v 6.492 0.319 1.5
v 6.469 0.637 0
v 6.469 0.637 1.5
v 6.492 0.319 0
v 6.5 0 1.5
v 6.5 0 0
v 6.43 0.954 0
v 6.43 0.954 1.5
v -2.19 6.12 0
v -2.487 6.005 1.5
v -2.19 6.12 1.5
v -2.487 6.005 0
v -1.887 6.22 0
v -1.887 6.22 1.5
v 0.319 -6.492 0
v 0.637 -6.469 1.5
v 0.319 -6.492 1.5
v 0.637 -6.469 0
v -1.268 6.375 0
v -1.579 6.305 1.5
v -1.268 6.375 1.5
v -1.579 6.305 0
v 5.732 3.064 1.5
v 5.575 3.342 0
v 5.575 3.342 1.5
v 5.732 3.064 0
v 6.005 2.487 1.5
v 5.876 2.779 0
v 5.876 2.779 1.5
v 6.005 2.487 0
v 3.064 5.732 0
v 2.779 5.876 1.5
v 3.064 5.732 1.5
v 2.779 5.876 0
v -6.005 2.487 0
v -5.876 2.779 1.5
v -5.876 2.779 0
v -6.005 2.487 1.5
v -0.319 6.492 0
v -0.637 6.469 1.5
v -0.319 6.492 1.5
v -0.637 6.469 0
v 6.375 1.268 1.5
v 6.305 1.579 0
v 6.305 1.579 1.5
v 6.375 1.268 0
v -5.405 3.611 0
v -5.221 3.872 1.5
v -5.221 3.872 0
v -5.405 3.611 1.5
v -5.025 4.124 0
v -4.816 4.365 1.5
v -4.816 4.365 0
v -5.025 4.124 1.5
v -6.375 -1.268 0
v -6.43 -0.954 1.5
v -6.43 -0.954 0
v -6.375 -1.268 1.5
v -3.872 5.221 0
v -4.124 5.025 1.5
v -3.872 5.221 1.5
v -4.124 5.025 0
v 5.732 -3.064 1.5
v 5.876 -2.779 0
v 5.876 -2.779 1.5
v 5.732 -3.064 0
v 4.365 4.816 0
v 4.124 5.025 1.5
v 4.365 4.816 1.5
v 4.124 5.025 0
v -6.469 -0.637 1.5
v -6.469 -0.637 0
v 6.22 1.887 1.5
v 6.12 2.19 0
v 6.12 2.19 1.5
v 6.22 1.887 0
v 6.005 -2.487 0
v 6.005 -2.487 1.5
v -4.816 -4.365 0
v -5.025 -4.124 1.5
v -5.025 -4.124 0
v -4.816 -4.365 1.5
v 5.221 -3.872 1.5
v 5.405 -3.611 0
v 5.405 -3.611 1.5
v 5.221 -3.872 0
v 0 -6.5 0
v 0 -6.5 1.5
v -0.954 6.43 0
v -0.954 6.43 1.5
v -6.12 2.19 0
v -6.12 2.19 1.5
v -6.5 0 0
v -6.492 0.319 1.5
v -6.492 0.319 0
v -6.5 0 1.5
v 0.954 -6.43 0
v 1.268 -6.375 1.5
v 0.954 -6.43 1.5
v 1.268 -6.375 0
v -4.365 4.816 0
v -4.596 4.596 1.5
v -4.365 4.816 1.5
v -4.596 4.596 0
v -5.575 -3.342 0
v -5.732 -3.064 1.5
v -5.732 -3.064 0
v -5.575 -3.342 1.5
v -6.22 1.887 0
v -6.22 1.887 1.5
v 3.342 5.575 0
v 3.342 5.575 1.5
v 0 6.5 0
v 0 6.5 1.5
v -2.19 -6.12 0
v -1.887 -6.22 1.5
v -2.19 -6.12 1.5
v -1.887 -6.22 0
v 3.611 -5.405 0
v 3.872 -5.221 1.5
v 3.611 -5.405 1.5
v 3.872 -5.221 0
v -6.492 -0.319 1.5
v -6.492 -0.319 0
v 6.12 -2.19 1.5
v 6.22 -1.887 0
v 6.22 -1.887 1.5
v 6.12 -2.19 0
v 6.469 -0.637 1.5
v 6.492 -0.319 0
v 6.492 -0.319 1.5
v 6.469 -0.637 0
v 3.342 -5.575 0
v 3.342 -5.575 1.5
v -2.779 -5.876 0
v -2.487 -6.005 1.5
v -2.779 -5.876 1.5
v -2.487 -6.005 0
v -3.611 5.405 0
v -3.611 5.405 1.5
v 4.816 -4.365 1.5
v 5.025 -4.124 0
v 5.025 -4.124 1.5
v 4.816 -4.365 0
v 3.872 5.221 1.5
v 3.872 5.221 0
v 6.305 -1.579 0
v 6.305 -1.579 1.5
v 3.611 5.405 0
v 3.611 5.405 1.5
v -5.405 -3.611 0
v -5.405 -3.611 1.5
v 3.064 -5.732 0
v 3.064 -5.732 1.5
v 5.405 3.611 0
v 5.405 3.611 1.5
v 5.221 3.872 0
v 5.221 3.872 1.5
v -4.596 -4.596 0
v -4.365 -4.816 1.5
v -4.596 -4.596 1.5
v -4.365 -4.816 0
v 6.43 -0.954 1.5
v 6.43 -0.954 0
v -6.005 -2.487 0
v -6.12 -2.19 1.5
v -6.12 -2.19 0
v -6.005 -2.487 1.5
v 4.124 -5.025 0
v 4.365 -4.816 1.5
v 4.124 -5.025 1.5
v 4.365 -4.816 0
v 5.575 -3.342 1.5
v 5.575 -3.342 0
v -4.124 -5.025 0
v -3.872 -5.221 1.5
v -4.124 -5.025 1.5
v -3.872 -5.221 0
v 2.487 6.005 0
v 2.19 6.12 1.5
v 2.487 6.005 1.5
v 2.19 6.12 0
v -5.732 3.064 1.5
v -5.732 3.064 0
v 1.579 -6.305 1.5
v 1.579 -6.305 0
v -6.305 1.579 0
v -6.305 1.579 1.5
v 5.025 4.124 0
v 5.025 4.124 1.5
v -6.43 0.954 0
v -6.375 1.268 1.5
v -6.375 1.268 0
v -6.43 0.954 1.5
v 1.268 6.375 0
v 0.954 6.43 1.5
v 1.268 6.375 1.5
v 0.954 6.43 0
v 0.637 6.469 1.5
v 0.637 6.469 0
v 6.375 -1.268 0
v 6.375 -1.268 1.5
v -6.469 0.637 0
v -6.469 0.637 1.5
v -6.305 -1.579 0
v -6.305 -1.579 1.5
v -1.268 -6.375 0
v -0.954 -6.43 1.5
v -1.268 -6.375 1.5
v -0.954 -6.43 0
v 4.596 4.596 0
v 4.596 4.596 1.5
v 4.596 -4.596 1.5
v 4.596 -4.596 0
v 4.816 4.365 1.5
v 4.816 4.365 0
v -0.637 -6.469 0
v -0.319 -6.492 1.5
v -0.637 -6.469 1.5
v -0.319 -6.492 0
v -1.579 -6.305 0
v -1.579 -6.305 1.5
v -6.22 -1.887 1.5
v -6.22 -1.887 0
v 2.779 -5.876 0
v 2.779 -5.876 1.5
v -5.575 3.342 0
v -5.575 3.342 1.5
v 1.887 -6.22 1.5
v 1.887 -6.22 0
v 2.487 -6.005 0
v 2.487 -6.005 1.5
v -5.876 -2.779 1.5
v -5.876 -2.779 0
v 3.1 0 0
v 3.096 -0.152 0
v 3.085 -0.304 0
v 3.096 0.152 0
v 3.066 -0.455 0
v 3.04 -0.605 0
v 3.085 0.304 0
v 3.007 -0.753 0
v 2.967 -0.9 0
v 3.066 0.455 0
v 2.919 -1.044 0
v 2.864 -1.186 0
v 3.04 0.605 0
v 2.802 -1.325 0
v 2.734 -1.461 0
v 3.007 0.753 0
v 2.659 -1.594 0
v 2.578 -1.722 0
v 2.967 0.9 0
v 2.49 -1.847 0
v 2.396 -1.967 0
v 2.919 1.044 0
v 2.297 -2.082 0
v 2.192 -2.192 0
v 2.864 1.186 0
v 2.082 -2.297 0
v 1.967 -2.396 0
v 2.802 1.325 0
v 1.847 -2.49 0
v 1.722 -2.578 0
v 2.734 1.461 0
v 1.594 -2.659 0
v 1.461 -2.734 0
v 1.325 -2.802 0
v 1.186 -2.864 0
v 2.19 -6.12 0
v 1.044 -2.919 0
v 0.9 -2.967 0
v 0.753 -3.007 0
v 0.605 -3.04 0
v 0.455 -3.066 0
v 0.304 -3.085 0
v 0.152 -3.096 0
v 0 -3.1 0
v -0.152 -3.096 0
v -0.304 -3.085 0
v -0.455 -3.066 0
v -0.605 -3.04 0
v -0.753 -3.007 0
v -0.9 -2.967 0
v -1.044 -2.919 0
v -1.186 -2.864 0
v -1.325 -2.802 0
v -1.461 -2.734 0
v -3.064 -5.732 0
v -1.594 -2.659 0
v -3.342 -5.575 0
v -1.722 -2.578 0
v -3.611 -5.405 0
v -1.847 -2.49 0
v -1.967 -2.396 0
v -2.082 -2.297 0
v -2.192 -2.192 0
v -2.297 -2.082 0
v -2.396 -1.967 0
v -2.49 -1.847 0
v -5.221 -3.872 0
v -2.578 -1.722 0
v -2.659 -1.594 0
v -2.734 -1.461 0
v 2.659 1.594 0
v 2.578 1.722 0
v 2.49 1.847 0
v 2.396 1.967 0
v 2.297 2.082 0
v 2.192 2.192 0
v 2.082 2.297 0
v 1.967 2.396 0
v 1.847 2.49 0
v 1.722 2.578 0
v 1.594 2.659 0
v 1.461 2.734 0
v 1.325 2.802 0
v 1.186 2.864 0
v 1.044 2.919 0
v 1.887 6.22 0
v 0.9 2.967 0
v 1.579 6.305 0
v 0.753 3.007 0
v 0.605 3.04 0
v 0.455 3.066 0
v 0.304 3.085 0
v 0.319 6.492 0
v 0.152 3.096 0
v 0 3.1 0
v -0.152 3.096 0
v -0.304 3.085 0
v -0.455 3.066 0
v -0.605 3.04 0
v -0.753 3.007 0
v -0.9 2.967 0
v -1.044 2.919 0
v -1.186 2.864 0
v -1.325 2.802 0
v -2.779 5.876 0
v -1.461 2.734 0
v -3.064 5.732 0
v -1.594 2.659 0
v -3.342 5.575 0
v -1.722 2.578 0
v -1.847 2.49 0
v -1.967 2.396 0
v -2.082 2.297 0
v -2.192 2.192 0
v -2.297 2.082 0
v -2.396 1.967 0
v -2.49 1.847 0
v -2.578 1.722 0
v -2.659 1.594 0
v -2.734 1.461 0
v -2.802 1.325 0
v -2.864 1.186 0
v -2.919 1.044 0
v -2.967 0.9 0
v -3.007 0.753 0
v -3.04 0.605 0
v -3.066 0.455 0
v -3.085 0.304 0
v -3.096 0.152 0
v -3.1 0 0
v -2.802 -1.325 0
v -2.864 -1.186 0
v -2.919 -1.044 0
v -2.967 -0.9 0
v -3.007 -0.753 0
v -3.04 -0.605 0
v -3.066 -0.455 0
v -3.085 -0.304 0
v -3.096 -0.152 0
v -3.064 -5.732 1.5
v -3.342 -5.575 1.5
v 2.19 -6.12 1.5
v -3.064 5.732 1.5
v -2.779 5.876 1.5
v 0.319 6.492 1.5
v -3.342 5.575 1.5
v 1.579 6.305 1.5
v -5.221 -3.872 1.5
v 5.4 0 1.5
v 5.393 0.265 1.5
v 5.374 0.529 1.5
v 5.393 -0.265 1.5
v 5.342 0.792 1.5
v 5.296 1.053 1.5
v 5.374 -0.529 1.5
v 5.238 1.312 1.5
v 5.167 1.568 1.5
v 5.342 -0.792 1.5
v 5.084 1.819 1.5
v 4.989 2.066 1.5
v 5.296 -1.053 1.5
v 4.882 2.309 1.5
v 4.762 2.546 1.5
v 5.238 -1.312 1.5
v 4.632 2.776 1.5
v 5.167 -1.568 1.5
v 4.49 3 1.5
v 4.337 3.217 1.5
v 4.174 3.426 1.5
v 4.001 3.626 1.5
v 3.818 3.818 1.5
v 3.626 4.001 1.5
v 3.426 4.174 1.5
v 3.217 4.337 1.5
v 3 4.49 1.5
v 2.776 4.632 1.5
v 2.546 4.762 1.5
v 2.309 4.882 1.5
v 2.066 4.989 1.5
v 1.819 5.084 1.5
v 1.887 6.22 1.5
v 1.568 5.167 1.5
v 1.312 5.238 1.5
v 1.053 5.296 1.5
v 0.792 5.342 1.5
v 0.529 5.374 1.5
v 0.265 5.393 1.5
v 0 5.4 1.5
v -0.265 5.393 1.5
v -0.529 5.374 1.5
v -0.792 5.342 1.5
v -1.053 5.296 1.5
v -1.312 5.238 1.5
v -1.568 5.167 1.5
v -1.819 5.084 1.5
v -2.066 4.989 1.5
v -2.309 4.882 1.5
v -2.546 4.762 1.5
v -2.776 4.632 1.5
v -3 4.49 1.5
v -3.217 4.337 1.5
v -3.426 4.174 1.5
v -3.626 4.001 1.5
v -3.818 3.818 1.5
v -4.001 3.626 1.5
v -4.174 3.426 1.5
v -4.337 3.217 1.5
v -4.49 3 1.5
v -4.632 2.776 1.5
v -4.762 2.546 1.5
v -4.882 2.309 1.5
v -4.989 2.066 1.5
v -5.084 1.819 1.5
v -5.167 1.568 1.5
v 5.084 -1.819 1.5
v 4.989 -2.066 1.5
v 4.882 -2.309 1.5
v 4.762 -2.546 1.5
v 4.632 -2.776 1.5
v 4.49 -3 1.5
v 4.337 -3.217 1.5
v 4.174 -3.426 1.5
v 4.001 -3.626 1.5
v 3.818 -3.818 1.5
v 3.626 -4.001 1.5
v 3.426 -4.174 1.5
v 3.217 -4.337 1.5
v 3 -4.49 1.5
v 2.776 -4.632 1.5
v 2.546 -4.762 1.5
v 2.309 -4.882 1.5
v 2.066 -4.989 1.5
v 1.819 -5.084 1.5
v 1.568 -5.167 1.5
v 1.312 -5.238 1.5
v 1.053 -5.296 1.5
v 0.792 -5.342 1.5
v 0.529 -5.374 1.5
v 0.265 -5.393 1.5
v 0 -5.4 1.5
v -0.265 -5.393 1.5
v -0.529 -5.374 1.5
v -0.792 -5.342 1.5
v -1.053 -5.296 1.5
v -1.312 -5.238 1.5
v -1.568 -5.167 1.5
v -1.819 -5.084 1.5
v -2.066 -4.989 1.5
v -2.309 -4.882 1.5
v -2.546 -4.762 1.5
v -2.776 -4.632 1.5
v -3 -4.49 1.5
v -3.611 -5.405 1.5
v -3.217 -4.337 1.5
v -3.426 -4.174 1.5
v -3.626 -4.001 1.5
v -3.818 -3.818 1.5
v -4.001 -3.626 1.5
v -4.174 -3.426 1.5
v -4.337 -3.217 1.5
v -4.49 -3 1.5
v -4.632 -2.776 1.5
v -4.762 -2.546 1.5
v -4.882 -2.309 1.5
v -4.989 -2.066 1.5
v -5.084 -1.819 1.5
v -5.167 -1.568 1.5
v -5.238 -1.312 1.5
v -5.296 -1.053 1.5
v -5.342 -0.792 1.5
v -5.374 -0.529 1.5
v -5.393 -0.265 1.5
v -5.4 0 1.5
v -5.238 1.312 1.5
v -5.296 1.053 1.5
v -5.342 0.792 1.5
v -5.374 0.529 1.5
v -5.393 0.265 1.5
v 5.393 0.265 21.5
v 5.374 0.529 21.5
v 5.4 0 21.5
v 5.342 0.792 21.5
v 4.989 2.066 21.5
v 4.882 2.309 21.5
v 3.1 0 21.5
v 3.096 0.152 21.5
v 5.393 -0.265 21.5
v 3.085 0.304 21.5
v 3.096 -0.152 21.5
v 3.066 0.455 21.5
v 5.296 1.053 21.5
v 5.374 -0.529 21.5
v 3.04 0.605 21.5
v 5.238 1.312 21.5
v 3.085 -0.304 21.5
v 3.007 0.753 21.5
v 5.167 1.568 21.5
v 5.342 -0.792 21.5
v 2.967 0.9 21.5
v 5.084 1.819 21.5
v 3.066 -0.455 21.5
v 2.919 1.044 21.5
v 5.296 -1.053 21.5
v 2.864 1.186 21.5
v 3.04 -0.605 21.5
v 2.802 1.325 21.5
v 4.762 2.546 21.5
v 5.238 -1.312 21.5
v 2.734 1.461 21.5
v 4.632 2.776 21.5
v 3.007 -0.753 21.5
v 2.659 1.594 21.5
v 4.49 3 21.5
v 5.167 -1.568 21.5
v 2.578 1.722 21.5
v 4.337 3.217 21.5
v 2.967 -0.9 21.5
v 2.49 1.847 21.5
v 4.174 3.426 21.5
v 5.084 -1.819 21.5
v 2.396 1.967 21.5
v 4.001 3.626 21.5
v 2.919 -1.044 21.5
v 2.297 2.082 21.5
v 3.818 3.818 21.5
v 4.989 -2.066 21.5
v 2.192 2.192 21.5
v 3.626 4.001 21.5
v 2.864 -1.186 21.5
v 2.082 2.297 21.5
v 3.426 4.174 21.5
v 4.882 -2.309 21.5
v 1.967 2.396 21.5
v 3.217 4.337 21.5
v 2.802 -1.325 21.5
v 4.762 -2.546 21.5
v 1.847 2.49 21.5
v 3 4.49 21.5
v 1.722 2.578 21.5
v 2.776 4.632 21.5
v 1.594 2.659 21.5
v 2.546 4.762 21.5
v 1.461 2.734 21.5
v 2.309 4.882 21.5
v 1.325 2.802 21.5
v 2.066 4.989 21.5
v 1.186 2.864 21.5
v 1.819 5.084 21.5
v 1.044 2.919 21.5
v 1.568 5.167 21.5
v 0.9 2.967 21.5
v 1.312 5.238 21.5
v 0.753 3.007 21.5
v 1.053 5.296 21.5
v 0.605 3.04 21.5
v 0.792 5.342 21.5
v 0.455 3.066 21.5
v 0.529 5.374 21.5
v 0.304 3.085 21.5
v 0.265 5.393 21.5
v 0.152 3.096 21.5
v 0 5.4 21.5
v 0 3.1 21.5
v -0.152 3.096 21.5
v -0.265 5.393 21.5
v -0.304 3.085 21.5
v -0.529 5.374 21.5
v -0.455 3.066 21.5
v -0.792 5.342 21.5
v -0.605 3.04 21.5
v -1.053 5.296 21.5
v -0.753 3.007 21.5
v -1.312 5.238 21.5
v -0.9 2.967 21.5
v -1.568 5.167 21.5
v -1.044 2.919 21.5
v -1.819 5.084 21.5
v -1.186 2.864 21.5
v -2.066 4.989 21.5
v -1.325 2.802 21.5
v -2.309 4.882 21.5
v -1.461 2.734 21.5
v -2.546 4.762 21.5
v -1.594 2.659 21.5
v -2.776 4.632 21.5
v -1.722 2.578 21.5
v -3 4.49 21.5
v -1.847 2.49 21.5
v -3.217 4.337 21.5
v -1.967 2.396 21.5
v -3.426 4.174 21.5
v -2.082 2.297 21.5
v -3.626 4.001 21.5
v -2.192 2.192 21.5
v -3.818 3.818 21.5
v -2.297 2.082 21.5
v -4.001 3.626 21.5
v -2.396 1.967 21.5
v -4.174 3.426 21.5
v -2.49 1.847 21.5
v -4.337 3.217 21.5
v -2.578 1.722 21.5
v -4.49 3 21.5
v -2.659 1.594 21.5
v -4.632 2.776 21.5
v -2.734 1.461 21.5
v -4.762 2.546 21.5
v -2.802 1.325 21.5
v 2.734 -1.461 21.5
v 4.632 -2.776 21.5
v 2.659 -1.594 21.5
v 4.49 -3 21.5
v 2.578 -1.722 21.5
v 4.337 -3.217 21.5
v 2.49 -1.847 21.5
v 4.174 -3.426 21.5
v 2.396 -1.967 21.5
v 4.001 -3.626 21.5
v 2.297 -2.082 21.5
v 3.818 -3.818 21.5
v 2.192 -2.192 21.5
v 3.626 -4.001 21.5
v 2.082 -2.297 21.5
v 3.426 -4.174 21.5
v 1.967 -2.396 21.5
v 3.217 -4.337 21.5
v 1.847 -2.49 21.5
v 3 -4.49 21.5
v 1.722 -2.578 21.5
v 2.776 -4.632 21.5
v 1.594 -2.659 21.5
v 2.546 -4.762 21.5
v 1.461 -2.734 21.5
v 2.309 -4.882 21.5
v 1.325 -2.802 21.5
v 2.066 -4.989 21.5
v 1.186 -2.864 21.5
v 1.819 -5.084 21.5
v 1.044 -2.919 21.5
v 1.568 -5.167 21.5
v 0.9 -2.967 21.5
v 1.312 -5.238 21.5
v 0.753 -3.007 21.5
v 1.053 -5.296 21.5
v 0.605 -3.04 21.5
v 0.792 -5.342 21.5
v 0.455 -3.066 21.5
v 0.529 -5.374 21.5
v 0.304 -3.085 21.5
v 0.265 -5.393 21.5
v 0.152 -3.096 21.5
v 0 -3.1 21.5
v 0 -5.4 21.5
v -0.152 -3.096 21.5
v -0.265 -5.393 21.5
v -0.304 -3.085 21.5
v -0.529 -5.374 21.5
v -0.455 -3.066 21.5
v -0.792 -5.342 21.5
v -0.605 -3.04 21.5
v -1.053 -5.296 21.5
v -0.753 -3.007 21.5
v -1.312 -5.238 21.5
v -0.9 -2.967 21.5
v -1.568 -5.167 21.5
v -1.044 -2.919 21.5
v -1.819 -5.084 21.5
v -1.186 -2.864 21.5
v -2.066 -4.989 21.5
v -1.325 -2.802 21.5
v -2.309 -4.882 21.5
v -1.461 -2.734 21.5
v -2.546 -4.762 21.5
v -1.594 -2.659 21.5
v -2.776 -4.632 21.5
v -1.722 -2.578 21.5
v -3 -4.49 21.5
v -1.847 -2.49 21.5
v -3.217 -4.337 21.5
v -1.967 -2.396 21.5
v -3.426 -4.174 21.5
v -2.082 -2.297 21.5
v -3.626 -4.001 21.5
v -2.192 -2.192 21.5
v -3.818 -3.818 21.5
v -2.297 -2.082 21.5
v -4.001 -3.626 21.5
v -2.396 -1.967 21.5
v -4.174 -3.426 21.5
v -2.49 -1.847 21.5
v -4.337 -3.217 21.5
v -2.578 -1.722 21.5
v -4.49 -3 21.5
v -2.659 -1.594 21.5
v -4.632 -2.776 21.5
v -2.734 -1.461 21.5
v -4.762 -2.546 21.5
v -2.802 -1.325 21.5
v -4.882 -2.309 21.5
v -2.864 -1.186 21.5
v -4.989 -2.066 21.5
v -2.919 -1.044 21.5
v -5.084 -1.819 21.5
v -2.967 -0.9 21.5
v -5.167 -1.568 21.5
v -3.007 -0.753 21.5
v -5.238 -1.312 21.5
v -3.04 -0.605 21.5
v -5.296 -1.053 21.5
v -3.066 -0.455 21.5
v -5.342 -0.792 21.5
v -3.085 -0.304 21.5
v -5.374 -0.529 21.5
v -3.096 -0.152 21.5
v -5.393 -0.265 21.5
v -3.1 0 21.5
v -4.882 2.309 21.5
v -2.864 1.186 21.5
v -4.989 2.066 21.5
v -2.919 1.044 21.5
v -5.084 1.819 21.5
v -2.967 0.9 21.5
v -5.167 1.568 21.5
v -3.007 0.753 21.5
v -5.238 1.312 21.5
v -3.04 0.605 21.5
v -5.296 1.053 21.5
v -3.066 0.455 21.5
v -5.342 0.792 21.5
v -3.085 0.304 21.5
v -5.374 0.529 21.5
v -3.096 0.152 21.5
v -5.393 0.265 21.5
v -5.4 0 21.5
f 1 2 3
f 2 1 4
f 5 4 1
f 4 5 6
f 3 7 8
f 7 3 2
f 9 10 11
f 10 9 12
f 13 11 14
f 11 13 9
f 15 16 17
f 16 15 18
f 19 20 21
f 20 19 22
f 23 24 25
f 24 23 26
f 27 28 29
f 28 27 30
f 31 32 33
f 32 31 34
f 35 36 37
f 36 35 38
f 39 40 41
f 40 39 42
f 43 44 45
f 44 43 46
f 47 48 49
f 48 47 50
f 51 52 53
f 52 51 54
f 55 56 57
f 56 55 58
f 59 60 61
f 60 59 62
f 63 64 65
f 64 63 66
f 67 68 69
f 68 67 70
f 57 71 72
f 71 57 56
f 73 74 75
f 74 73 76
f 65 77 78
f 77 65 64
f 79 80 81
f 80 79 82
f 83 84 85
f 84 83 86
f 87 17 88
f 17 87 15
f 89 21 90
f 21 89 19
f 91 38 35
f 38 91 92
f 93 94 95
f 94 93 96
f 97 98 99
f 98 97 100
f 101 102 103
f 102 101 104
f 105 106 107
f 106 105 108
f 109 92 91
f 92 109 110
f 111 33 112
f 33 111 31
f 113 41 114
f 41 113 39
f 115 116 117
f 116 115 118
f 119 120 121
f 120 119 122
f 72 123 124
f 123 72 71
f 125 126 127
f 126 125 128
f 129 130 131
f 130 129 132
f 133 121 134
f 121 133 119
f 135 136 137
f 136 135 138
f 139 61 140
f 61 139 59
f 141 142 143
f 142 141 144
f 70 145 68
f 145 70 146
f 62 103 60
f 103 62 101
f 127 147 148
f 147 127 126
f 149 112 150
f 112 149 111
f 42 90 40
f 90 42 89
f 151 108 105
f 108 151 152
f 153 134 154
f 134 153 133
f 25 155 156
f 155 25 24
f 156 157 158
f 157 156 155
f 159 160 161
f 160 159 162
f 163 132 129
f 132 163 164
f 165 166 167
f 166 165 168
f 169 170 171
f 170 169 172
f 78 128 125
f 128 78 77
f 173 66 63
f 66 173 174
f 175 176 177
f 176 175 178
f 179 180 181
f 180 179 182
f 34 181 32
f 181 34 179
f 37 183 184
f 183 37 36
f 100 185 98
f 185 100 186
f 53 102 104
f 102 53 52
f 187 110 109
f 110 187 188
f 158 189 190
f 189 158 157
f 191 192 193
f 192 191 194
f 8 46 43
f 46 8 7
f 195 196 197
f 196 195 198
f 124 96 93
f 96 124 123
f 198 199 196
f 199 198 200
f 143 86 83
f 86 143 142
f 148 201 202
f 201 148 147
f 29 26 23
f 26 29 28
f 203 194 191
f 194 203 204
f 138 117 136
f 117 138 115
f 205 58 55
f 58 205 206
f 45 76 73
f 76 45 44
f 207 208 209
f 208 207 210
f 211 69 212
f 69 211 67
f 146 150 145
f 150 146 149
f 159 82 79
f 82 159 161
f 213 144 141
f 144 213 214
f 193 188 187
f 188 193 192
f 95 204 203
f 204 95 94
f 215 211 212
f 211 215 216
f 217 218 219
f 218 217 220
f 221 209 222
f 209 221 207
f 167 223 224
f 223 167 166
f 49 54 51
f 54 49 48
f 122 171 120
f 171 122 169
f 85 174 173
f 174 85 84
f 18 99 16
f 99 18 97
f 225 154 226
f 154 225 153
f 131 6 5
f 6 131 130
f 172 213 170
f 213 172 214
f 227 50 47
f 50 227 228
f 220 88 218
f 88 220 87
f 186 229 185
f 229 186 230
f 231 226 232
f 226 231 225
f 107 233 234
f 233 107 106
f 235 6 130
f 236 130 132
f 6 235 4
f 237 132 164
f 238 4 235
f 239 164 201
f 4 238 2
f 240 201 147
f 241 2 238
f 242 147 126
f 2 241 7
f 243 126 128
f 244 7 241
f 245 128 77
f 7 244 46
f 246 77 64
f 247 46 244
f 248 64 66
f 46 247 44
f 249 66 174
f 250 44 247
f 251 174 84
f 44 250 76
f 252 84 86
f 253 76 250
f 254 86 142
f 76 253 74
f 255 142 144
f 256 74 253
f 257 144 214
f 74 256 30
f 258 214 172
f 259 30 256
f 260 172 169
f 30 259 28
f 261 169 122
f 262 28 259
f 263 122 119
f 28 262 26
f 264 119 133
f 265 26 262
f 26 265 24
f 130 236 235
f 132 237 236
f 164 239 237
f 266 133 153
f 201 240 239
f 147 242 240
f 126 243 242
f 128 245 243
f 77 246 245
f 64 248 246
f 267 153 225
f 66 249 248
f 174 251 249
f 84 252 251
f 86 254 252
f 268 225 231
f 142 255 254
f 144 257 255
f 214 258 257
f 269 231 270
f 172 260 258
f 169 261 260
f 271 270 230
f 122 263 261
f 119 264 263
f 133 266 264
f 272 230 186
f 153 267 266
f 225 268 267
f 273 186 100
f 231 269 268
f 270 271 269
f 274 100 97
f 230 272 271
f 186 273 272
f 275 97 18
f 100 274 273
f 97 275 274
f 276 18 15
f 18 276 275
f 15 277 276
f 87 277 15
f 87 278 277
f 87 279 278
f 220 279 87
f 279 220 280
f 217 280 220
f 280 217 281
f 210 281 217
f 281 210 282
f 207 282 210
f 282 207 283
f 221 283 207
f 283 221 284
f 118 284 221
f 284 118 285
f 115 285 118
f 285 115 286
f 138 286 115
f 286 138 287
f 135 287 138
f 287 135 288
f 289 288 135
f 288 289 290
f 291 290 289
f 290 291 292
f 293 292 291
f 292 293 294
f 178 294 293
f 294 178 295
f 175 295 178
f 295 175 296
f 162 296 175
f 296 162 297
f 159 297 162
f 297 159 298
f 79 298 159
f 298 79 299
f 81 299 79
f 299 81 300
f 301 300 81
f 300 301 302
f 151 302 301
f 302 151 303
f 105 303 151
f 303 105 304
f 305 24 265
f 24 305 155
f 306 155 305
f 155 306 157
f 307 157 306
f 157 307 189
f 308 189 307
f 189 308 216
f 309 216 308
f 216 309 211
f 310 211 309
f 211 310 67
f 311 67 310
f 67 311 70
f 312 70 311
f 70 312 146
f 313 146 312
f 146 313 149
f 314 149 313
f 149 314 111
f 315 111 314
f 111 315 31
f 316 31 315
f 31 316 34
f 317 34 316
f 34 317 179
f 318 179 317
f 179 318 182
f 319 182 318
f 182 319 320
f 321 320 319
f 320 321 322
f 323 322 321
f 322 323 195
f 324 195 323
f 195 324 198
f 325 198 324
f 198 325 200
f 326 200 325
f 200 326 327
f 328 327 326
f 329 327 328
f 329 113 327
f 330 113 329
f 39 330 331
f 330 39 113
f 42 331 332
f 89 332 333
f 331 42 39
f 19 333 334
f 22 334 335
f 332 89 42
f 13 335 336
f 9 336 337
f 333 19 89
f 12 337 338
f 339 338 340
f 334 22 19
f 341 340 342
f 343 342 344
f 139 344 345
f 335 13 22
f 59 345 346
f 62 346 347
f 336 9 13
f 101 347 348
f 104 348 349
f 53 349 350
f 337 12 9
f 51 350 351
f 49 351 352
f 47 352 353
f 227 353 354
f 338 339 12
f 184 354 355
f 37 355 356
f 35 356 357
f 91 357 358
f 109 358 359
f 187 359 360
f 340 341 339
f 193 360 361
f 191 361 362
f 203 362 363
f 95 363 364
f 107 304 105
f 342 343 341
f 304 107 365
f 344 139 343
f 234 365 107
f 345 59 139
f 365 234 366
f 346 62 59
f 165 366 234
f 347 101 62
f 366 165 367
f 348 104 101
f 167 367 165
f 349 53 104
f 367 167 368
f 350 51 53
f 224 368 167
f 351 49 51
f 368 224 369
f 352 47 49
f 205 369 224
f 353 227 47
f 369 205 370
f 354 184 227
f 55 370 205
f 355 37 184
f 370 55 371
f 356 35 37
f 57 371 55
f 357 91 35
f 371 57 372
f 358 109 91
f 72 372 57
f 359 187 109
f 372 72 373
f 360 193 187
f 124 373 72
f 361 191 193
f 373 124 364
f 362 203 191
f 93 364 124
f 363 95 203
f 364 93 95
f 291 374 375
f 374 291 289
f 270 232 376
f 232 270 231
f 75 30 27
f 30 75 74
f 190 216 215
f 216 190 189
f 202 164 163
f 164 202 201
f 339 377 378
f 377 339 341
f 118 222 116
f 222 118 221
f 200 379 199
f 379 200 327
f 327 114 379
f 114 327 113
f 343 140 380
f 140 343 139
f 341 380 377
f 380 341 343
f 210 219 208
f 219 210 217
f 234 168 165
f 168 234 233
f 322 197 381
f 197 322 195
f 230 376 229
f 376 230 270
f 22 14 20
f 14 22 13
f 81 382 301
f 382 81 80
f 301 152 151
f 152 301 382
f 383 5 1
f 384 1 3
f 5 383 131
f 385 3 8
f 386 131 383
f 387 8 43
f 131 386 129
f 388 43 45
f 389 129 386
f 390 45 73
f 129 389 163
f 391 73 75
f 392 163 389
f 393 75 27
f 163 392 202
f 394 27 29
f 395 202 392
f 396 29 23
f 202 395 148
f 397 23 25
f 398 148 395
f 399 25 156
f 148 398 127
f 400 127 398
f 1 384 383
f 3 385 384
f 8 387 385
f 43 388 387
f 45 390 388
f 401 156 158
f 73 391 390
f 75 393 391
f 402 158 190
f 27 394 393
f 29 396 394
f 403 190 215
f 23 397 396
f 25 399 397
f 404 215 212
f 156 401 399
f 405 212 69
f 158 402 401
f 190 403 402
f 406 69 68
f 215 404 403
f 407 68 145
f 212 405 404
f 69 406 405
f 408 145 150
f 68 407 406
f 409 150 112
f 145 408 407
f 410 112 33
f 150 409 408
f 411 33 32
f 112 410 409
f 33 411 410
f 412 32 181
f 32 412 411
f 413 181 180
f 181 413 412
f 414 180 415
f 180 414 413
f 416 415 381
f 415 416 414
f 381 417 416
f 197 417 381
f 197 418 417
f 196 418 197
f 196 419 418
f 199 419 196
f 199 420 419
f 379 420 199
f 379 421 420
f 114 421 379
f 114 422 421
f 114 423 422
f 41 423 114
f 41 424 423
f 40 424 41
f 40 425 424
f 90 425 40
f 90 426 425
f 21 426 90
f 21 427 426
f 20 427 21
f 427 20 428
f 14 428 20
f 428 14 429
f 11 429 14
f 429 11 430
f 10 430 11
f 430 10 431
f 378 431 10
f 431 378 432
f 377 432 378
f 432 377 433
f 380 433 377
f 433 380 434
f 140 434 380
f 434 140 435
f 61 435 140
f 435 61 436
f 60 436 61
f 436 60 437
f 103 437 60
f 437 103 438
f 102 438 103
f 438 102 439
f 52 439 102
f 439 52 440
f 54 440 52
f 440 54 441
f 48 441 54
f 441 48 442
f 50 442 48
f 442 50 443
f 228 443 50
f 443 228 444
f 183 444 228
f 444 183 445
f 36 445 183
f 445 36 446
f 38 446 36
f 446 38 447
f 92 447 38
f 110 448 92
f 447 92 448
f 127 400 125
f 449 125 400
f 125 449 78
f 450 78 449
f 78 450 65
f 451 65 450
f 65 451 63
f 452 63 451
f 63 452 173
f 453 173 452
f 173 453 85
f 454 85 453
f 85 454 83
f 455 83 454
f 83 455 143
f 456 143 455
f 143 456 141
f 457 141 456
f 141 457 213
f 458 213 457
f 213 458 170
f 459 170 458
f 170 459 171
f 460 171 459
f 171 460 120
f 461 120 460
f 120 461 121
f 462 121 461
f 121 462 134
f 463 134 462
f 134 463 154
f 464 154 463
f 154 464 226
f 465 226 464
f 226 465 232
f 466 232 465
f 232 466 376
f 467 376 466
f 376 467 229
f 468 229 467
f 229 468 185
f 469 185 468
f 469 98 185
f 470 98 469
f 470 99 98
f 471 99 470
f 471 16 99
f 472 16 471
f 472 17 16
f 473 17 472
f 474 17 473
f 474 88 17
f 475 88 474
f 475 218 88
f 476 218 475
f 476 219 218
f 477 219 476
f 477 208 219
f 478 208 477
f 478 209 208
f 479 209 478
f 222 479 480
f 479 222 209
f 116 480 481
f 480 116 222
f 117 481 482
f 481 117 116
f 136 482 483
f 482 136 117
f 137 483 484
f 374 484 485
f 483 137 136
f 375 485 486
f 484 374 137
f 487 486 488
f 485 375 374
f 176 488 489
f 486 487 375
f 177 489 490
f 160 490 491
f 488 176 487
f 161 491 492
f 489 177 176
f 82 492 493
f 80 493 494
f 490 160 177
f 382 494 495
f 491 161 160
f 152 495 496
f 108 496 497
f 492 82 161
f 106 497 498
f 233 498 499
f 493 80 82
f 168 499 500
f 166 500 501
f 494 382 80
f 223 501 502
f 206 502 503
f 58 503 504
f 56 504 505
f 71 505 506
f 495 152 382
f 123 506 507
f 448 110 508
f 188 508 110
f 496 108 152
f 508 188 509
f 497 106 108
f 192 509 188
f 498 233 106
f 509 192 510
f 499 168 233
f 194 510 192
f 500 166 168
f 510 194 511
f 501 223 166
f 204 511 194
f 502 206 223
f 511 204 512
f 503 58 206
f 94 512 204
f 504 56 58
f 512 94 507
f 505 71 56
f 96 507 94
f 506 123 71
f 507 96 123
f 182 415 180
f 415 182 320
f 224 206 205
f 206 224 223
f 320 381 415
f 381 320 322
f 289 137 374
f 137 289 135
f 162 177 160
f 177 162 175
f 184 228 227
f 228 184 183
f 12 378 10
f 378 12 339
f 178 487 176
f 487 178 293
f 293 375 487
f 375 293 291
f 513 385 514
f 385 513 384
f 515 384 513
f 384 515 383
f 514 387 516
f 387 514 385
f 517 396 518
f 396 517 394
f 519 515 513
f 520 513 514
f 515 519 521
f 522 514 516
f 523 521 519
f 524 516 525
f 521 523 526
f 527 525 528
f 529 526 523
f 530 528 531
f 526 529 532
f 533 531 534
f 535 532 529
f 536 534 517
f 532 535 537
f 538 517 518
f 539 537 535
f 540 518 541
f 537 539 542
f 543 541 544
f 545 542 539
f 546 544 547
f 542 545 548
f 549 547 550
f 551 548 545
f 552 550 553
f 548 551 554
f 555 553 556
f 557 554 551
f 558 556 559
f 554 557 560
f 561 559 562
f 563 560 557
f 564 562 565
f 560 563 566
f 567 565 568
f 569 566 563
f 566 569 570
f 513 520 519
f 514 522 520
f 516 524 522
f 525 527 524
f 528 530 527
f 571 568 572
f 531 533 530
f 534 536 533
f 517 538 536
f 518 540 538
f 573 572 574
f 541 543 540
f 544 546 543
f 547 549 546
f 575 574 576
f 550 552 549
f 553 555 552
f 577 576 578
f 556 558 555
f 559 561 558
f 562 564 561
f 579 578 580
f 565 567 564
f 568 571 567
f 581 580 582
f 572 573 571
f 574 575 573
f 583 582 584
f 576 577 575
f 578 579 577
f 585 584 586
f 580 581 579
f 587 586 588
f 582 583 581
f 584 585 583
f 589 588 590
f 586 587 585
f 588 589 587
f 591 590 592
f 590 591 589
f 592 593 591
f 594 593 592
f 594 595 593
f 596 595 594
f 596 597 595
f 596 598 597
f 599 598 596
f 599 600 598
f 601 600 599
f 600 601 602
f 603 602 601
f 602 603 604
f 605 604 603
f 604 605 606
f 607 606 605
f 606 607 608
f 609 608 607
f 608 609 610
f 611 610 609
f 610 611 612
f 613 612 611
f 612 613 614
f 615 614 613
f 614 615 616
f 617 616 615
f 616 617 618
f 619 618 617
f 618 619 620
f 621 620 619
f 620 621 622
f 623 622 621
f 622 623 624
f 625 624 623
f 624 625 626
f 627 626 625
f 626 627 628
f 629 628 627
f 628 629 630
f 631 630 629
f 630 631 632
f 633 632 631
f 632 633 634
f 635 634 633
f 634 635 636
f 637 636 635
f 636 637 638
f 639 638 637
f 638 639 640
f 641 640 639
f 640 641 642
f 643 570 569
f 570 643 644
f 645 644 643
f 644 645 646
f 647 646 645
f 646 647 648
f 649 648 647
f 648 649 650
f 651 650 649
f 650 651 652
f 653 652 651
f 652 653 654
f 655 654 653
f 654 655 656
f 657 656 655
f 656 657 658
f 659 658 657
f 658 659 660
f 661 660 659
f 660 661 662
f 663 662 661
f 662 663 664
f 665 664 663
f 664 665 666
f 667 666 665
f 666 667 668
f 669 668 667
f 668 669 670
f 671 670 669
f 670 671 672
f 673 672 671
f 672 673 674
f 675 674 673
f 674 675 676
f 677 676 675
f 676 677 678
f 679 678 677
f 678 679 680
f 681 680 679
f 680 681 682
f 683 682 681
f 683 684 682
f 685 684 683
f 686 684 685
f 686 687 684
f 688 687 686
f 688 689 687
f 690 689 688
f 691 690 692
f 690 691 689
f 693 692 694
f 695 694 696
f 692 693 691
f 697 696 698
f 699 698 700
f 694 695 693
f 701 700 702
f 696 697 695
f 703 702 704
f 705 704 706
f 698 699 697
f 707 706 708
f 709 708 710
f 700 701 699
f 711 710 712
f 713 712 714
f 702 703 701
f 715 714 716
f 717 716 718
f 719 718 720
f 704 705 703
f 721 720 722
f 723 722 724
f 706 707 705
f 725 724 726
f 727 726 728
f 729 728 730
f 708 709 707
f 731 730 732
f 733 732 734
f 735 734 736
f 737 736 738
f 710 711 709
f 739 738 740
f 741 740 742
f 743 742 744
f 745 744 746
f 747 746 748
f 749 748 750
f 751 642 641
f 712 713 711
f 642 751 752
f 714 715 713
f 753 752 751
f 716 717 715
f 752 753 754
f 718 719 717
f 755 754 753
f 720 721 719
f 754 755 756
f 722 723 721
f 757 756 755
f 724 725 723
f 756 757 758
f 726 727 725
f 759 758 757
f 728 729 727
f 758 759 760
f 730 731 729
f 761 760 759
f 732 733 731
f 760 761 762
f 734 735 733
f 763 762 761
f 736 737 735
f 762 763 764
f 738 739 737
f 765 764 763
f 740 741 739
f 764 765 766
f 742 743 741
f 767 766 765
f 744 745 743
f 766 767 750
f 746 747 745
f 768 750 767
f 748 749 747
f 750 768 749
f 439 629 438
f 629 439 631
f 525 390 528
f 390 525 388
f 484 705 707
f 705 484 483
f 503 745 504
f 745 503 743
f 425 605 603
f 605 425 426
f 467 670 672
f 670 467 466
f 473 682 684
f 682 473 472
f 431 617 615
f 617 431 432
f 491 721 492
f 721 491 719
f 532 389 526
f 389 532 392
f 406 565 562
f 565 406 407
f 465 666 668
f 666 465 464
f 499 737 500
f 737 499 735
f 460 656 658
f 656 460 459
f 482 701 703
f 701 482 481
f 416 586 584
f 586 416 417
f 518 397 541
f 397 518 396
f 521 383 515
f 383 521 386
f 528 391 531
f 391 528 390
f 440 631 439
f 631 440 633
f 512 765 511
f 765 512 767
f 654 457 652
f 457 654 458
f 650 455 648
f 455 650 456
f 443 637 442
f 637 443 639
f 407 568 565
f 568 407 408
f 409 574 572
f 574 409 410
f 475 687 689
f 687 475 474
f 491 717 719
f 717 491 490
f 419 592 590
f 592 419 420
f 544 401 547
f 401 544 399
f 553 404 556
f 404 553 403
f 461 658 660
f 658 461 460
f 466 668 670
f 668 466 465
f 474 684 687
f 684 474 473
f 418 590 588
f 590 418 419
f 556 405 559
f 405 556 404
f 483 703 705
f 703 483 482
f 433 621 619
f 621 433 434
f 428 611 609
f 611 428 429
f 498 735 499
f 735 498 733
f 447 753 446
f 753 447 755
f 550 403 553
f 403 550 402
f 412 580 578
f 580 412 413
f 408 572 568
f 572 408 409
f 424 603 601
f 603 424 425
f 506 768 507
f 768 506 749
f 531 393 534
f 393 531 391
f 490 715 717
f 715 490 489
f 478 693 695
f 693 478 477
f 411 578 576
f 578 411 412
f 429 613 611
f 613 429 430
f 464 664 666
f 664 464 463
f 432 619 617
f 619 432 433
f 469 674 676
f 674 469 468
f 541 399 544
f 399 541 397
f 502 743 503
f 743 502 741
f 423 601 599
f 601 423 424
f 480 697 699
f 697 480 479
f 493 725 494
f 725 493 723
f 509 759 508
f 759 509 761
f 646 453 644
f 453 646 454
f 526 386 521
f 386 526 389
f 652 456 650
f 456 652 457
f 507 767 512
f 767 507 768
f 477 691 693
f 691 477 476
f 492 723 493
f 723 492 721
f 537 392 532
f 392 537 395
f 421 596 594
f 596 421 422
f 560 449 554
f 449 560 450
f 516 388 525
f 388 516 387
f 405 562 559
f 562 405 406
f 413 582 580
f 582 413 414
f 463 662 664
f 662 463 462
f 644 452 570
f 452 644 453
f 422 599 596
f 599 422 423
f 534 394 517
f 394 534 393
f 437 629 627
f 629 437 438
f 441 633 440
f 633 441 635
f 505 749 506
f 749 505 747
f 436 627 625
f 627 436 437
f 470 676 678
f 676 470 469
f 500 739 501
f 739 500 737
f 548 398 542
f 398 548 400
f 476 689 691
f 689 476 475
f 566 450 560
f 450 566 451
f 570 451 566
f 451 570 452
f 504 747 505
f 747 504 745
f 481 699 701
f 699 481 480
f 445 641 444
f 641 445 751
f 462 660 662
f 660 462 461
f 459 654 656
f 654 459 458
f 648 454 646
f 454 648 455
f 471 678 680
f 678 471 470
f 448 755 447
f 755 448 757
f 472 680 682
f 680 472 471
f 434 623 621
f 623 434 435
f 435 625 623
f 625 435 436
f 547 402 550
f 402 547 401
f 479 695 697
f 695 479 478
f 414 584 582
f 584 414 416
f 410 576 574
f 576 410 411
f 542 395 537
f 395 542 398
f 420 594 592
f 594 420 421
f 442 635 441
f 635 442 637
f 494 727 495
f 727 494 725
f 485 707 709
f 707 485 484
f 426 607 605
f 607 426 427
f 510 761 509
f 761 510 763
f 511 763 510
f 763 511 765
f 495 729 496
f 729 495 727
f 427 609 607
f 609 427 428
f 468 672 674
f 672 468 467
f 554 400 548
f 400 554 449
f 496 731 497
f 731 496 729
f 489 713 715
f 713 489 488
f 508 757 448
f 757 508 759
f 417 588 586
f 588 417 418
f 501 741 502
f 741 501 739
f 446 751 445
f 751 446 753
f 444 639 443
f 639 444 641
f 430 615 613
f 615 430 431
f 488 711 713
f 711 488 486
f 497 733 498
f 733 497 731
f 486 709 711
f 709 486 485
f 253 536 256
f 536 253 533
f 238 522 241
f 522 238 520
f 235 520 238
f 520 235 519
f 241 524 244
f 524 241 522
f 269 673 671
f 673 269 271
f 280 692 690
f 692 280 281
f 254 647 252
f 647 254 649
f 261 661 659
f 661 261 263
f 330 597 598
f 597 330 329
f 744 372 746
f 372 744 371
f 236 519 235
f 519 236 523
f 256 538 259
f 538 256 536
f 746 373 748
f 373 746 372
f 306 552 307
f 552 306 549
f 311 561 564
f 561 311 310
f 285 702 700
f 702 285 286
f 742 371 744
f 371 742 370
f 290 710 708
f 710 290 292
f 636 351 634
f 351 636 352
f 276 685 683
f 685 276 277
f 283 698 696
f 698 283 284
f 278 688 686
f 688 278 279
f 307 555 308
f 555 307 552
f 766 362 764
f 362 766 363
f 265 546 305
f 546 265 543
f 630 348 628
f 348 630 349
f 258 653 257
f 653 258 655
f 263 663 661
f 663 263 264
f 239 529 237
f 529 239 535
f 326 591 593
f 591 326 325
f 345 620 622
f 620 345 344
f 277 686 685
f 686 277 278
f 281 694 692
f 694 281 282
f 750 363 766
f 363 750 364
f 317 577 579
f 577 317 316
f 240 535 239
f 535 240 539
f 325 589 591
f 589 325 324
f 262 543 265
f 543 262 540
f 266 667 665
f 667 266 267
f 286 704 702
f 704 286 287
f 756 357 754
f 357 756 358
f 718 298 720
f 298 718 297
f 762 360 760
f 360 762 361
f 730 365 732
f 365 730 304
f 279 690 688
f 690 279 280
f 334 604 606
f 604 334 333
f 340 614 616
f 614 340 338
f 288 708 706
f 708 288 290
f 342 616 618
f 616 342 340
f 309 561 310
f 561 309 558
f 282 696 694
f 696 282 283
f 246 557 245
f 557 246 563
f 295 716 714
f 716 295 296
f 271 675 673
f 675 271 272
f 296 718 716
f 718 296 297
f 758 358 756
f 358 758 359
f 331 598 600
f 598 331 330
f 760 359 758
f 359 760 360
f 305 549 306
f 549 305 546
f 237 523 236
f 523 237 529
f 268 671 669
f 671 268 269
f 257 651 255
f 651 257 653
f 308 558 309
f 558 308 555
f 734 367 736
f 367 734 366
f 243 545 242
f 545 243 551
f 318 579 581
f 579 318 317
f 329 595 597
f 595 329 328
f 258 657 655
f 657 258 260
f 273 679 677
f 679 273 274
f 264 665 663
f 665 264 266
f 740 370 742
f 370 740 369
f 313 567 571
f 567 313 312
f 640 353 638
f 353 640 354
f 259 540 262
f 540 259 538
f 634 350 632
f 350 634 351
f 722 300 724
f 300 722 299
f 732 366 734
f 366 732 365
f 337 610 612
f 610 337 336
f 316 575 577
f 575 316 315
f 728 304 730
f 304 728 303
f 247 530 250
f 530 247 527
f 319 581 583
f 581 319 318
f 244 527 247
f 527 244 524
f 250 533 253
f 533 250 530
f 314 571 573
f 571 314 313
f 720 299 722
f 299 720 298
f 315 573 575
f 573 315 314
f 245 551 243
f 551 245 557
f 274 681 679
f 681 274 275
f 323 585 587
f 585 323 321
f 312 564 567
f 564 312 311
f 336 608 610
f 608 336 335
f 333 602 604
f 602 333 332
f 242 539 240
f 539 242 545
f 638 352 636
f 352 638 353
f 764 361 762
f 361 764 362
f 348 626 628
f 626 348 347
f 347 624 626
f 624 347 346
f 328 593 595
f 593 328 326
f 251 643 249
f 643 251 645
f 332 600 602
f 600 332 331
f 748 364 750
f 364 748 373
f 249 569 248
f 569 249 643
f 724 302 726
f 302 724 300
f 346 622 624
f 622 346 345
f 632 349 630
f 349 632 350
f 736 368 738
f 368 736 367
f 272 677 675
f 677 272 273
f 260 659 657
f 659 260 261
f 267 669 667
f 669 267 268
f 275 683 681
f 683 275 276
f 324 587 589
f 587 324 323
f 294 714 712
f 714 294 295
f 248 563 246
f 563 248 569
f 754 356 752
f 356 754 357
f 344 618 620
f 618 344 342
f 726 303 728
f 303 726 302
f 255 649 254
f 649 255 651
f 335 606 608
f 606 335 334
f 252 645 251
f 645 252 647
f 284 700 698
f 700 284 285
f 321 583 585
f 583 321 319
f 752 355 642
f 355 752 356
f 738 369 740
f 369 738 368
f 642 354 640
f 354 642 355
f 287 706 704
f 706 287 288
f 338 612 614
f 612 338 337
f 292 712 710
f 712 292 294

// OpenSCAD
// Adapter sleeve: 0.2 mL PCR tube in a 1.5 mL rack hole
// Print orientation: collar down on the bed (z = 0), sleeve up (+Z)

$fn = 128;

// ---- Dimensions (mm) ----
collar_d      = 13;    // collar diameter (bottom)
collar_h      = 1.5;   // collar thickness
sleeve_od     = 10.8;  // sleeve outer diameter
sleeve_top_z  = 21.5;  // top of sleeve
bore_d        = 6.2;   // through-bore diameter
eps           = 0.5;   // cutter overshoot

// ---- Model ----
difference() {
    union() {
        // Collar
        cylinder(d = collar_d, h = collar_h);
        // Sleeve body (slightly overlapping collar for a clean union)
        translate([0, 0, collar_h - 0.01])
            cylinder(d = sleeve_od, h = sleeve_top_z - collar_h + 0.01);
    }
    // Full-height bore
    translate([0, 0, -eps])
        cylinder(d = bore_d, h = sleeve_top_z + 2 * eps);
}
